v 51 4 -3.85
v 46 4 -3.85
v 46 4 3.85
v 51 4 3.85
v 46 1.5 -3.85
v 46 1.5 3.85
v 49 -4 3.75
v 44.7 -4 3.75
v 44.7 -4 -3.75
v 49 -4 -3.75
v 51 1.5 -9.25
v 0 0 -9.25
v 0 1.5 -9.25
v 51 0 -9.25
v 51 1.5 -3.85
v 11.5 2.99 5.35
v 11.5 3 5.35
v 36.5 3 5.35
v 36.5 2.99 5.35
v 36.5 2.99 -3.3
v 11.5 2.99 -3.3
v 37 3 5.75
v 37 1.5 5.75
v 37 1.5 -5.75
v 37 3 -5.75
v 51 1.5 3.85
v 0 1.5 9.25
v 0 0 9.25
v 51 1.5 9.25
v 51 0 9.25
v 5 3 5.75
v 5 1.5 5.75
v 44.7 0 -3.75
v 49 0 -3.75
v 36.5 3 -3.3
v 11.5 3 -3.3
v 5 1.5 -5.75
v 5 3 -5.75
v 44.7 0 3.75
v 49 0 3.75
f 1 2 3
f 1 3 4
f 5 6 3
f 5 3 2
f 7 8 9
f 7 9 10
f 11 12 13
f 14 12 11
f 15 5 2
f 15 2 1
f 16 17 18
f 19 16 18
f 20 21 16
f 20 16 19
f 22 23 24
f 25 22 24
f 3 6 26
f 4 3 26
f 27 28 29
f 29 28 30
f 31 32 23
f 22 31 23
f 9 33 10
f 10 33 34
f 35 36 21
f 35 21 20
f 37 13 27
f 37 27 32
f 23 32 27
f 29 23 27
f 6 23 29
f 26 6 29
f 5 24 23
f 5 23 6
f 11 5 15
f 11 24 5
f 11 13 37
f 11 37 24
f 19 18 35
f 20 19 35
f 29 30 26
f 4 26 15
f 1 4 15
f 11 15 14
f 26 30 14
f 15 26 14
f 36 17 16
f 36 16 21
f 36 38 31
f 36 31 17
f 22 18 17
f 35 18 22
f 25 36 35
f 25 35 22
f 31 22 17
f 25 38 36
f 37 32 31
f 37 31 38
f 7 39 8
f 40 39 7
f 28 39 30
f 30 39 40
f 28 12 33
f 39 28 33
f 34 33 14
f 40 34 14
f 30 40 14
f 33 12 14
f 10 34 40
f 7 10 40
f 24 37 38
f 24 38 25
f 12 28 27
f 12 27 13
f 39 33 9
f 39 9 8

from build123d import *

# Parameters (mm, degrees)
SKETCH1_W           = 51
SKETCH1_H           = 18.5
BOSS_EXTRUDE1_DEPTH = 1.5
SKETCH2_W           = 32
SKETCH2_H           = 11.5
BOSS_EXTRUDE2_DEPTH = 1.5
SKETCH3_W           = 5
SKETCH3_H           = 7.7
BOSS_EXTRUDE3_DEPTH = 2.5
SKETCH4_W           = 4.3
SKETCH4_H           = 7.5
BOSS_EXTRUDE4_DEPTH = 4
SKETCH5_W           = 25
SKETCH5_H           = 8.65
CUT_EXTRUDE1_DEPTH  = 0.01


with BuildPart() as part:
    # Sketch1 → Boss-Extrude1 (new body)
    with BuildSketch(Plane(origin=(0, 0, 27), x_dir=(1, 0, 0), z_dir=(0, 1, 0))):
        with Locations((25.5, 27)):
            Rectangle(SKETCH1_W, SKETCH1_H)
    extrude(amount=BOSS_EXTRUDE1_DEPTH)

    # Sketch2 → Boss-Extrude2 (add)
    with BuildSketch(Plane(origin=(0, 1.5, 0), x_dir=(1, 0, 0), z_dir=(0, 1, 0))):
        with Locations((21, 0)):
            Rectangle(SKETCH2_W, SKETCH2_H)
    extrude(amount=BOSS_EXTRUDE2_DEPTH)

    # Sketch3 → Boss-Extrude3 (add)
    with BuildSketch(Plane(origin=(0, 1.5, 0), x_dir=(1, 0, 0), z_dir=(0, 1, 0))):
        with Locations((48.5, 0)):
            Rectangle(SKETCH3_W, SKETCH3_H)
    extrude(amount=BOSS_EXTRUDE3_DEPTH)

    # Sketch4 → Boss-Extrude4 (add)
    with BuildSketch(Plane.XZ):
        with Locations((46.85, 0)):
            Rectangle(SKETCH4_W, SKETCH4_H)
    extrude(amount=BOSS_EXTRUDE4_DEPTH)

    # Sketch5 → Cut-Extrude1 (cut)
    with BuildSketch(Plane(origin=(0, 3, 0), x_dir=(1, 0, 0), z_dir=(0, 1, 0))):
        with Locations((24, -1.025)):
            Rectangle(SKETCH5_W, SKETCH5_H)
    extrude(amount=-CUT_EXTRUDE1_DEPTH, mode=Mode.SUBTRACT)


solid = part.part
